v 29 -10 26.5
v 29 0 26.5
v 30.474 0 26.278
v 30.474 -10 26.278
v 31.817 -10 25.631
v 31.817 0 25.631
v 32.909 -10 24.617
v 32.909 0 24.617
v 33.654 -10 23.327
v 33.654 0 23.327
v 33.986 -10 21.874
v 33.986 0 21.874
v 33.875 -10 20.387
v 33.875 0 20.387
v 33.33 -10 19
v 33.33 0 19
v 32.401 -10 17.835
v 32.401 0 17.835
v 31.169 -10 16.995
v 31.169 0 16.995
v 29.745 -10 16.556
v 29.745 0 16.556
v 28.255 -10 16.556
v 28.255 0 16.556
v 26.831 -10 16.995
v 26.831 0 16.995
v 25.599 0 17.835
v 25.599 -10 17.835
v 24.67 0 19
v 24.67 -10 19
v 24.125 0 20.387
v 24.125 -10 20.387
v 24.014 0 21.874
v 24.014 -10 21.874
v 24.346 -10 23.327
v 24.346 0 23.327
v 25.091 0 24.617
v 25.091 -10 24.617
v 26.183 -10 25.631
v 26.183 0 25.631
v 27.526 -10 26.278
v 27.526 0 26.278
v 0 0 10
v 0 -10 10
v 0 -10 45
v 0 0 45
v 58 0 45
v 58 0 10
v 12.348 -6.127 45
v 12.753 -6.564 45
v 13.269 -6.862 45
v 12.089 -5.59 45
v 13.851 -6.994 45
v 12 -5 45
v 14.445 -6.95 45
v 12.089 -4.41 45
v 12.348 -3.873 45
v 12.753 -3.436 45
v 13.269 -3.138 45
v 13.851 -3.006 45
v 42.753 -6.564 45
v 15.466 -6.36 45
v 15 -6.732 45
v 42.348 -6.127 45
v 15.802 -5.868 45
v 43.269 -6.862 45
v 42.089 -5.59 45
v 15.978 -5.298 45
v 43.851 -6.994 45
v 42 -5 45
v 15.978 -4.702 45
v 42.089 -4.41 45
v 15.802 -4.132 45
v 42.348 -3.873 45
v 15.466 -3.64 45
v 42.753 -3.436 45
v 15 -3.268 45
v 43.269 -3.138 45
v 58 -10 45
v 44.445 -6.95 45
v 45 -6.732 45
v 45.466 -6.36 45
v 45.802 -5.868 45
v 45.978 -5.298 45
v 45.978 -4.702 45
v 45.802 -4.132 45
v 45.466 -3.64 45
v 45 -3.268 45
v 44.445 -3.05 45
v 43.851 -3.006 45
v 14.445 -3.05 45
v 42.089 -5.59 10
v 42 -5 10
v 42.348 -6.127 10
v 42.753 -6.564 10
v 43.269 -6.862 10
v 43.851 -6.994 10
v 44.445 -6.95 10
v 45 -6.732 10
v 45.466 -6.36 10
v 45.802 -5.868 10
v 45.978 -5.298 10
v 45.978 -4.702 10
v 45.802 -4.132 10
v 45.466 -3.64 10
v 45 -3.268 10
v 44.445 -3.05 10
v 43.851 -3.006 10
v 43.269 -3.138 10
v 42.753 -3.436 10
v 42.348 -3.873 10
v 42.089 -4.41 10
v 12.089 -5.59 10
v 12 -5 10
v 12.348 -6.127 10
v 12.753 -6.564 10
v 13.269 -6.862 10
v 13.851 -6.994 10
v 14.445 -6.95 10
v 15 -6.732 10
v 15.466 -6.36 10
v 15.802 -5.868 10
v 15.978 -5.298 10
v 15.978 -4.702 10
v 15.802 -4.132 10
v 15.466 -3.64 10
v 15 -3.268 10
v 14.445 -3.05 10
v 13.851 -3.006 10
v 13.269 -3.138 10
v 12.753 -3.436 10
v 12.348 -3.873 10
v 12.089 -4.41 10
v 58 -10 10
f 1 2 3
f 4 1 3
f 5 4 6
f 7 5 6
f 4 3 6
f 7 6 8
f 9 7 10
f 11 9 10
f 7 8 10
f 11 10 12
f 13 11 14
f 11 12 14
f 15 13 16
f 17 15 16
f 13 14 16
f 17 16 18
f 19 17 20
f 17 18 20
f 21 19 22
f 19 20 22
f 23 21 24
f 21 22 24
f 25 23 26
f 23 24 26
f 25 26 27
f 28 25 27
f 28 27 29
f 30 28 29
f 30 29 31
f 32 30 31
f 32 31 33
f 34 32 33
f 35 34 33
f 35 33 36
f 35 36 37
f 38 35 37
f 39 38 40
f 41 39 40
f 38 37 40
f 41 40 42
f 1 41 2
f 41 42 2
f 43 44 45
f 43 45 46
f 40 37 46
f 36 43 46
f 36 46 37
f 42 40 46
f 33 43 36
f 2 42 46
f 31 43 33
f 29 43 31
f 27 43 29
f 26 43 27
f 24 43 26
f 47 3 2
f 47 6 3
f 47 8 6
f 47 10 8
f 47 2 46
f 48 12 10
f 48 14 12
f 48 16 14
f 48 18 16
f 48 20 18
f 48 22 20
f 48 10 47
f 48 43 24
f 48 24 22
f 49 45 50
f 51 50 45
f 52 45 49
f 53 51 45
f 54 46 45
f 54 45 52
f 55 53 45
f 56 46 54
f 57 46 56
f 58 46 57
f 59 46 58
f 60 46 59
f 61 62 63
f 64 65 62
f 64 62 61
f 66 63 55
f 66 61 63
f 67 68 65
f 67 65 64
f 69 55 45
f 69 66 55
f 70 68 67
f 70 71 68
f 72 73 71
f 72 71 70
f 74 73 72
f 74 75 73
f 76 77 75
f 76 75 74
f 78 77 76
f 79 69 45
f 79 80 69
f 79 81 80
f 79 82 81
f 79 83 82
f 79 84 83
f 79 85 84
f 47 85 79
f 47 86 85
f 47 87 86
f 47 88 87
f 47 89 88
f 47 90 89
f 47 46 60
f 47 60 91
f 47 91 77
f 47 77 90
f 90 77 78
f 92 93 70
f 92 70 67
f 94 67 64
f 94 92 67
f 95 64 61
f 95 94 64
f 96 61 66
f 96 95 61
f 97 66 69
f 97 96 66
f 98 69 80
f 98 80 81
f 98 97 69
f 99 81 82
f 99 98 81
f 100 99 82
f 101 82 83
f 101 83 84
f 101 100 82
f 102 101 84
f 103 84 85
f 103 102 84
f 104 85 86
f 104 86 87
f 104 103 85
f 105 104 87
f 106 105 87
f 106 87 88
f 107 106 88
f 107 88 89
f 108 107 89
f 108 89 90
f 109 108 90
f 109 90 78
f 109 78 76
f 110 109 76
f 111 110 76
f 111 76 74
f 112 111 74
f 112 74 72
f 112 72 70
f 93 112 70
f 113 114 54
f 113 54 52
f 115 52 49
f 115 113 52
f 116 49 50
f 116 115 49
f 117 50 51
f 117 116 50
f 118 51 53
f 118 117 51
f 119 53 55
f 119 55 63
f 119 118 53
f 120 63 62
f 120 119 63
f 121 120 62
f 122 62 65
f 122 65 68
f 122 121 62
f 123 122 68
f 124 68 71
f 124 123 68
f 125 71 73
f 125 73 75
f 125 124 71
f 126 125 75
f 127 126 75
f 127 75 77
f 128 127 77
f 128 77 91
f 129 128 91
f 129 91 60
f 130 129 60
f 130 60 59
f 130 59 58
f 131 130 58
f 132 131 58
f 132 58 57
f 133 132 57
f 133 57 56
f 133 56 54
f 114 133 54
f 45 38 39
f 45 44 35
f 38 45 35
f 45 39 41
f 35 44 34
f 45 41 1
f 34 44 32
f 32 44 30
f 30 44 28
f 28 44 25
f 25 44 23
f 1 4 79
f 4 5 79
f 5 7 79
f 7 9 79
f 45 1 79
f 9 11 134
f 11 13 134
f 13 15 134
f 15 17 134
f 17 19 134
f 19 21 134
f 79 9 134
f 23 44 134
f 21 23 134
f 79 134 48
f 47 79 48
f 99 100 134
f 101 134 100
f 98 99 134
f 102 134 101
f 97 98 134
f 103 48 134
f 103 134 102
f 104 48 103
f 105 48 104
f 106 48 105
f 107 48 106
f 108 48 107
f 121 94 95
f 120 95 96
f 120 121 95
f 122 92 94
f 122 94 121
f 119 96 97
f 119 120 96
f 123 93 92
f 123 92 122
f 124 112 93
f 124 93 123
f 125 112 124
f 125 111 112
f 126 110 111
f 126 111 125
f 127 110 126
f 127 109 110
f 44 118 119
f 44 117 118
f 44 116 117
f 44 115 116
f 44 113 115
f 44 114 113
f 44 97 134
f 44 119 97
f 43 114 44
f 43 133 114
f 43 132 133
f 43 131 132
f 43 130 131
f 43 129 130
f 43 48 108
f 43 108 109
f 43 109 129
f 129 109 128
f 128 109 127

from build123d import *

# Parameters (mm, degrees)
SKETCH1_W           = 58
SKETCH1_H           = 10
SKETCH1_R           = 2
BOSS_EXTRUDE1_DEPTH = 45
SKETCH3_W           = 58
SKETCH3_H           = 10
CUT_EXTRUDE3_DEPTH  = 10
SKETCH4_R           = 5
CUT_EXTRUDE4_DEPTH  = 10


with BuildPart() as part:
    # Sketch1 → Boss-Extrude1 (new body)
    with BuildSketch(Plane.XY):
        with Locations((29, -5)):
            Rectangle(SKETCH1_W, SKETCH1_H)
        with Locations(Location((14, -5, 0), (0, 0, 180))):
            Circle(SKETCH1_R, mode=Mode.SUBTRACT)
        with Locations(Location((44, -5, 0), (0, 0, 180))):
            Circle(SKETCH1_R, mode=Mode.SUBTRACT)
    extrude(amount=BOSS_EXTRUDE1_DEPTH)

    # Sketch3 → Cut-Extrude3 (cut)
    with BuildSketch(Plane(origin=(0, 0, 0), x_dir=(-1, 0, 0), z_dir=(0, 0, -1))):
        with Locations((-29, -5)):
            Rectangle(SKETCH3_W, SKETCH3_H)
    extrude(amount=-CUT_EXTRUDE3_DEPTH, mode=Mode.SUBTRACT)

    # Sketch4 → Cut-Extrude4 (cut)
    with BuildSketch(Plane(origin=(0, 0, 0), x_dir=(1, 0, 0), z_dir=(0, 1, 0))):
        with Locations(Location((29, -21.5, 0), (0, 0, 270))):
            Circle(SKETCH4_R)
    extrude(amount=-CUT_EXTRUDE4_DEPTH, mode=Mode.SUBTRACT)


solid = part.part
